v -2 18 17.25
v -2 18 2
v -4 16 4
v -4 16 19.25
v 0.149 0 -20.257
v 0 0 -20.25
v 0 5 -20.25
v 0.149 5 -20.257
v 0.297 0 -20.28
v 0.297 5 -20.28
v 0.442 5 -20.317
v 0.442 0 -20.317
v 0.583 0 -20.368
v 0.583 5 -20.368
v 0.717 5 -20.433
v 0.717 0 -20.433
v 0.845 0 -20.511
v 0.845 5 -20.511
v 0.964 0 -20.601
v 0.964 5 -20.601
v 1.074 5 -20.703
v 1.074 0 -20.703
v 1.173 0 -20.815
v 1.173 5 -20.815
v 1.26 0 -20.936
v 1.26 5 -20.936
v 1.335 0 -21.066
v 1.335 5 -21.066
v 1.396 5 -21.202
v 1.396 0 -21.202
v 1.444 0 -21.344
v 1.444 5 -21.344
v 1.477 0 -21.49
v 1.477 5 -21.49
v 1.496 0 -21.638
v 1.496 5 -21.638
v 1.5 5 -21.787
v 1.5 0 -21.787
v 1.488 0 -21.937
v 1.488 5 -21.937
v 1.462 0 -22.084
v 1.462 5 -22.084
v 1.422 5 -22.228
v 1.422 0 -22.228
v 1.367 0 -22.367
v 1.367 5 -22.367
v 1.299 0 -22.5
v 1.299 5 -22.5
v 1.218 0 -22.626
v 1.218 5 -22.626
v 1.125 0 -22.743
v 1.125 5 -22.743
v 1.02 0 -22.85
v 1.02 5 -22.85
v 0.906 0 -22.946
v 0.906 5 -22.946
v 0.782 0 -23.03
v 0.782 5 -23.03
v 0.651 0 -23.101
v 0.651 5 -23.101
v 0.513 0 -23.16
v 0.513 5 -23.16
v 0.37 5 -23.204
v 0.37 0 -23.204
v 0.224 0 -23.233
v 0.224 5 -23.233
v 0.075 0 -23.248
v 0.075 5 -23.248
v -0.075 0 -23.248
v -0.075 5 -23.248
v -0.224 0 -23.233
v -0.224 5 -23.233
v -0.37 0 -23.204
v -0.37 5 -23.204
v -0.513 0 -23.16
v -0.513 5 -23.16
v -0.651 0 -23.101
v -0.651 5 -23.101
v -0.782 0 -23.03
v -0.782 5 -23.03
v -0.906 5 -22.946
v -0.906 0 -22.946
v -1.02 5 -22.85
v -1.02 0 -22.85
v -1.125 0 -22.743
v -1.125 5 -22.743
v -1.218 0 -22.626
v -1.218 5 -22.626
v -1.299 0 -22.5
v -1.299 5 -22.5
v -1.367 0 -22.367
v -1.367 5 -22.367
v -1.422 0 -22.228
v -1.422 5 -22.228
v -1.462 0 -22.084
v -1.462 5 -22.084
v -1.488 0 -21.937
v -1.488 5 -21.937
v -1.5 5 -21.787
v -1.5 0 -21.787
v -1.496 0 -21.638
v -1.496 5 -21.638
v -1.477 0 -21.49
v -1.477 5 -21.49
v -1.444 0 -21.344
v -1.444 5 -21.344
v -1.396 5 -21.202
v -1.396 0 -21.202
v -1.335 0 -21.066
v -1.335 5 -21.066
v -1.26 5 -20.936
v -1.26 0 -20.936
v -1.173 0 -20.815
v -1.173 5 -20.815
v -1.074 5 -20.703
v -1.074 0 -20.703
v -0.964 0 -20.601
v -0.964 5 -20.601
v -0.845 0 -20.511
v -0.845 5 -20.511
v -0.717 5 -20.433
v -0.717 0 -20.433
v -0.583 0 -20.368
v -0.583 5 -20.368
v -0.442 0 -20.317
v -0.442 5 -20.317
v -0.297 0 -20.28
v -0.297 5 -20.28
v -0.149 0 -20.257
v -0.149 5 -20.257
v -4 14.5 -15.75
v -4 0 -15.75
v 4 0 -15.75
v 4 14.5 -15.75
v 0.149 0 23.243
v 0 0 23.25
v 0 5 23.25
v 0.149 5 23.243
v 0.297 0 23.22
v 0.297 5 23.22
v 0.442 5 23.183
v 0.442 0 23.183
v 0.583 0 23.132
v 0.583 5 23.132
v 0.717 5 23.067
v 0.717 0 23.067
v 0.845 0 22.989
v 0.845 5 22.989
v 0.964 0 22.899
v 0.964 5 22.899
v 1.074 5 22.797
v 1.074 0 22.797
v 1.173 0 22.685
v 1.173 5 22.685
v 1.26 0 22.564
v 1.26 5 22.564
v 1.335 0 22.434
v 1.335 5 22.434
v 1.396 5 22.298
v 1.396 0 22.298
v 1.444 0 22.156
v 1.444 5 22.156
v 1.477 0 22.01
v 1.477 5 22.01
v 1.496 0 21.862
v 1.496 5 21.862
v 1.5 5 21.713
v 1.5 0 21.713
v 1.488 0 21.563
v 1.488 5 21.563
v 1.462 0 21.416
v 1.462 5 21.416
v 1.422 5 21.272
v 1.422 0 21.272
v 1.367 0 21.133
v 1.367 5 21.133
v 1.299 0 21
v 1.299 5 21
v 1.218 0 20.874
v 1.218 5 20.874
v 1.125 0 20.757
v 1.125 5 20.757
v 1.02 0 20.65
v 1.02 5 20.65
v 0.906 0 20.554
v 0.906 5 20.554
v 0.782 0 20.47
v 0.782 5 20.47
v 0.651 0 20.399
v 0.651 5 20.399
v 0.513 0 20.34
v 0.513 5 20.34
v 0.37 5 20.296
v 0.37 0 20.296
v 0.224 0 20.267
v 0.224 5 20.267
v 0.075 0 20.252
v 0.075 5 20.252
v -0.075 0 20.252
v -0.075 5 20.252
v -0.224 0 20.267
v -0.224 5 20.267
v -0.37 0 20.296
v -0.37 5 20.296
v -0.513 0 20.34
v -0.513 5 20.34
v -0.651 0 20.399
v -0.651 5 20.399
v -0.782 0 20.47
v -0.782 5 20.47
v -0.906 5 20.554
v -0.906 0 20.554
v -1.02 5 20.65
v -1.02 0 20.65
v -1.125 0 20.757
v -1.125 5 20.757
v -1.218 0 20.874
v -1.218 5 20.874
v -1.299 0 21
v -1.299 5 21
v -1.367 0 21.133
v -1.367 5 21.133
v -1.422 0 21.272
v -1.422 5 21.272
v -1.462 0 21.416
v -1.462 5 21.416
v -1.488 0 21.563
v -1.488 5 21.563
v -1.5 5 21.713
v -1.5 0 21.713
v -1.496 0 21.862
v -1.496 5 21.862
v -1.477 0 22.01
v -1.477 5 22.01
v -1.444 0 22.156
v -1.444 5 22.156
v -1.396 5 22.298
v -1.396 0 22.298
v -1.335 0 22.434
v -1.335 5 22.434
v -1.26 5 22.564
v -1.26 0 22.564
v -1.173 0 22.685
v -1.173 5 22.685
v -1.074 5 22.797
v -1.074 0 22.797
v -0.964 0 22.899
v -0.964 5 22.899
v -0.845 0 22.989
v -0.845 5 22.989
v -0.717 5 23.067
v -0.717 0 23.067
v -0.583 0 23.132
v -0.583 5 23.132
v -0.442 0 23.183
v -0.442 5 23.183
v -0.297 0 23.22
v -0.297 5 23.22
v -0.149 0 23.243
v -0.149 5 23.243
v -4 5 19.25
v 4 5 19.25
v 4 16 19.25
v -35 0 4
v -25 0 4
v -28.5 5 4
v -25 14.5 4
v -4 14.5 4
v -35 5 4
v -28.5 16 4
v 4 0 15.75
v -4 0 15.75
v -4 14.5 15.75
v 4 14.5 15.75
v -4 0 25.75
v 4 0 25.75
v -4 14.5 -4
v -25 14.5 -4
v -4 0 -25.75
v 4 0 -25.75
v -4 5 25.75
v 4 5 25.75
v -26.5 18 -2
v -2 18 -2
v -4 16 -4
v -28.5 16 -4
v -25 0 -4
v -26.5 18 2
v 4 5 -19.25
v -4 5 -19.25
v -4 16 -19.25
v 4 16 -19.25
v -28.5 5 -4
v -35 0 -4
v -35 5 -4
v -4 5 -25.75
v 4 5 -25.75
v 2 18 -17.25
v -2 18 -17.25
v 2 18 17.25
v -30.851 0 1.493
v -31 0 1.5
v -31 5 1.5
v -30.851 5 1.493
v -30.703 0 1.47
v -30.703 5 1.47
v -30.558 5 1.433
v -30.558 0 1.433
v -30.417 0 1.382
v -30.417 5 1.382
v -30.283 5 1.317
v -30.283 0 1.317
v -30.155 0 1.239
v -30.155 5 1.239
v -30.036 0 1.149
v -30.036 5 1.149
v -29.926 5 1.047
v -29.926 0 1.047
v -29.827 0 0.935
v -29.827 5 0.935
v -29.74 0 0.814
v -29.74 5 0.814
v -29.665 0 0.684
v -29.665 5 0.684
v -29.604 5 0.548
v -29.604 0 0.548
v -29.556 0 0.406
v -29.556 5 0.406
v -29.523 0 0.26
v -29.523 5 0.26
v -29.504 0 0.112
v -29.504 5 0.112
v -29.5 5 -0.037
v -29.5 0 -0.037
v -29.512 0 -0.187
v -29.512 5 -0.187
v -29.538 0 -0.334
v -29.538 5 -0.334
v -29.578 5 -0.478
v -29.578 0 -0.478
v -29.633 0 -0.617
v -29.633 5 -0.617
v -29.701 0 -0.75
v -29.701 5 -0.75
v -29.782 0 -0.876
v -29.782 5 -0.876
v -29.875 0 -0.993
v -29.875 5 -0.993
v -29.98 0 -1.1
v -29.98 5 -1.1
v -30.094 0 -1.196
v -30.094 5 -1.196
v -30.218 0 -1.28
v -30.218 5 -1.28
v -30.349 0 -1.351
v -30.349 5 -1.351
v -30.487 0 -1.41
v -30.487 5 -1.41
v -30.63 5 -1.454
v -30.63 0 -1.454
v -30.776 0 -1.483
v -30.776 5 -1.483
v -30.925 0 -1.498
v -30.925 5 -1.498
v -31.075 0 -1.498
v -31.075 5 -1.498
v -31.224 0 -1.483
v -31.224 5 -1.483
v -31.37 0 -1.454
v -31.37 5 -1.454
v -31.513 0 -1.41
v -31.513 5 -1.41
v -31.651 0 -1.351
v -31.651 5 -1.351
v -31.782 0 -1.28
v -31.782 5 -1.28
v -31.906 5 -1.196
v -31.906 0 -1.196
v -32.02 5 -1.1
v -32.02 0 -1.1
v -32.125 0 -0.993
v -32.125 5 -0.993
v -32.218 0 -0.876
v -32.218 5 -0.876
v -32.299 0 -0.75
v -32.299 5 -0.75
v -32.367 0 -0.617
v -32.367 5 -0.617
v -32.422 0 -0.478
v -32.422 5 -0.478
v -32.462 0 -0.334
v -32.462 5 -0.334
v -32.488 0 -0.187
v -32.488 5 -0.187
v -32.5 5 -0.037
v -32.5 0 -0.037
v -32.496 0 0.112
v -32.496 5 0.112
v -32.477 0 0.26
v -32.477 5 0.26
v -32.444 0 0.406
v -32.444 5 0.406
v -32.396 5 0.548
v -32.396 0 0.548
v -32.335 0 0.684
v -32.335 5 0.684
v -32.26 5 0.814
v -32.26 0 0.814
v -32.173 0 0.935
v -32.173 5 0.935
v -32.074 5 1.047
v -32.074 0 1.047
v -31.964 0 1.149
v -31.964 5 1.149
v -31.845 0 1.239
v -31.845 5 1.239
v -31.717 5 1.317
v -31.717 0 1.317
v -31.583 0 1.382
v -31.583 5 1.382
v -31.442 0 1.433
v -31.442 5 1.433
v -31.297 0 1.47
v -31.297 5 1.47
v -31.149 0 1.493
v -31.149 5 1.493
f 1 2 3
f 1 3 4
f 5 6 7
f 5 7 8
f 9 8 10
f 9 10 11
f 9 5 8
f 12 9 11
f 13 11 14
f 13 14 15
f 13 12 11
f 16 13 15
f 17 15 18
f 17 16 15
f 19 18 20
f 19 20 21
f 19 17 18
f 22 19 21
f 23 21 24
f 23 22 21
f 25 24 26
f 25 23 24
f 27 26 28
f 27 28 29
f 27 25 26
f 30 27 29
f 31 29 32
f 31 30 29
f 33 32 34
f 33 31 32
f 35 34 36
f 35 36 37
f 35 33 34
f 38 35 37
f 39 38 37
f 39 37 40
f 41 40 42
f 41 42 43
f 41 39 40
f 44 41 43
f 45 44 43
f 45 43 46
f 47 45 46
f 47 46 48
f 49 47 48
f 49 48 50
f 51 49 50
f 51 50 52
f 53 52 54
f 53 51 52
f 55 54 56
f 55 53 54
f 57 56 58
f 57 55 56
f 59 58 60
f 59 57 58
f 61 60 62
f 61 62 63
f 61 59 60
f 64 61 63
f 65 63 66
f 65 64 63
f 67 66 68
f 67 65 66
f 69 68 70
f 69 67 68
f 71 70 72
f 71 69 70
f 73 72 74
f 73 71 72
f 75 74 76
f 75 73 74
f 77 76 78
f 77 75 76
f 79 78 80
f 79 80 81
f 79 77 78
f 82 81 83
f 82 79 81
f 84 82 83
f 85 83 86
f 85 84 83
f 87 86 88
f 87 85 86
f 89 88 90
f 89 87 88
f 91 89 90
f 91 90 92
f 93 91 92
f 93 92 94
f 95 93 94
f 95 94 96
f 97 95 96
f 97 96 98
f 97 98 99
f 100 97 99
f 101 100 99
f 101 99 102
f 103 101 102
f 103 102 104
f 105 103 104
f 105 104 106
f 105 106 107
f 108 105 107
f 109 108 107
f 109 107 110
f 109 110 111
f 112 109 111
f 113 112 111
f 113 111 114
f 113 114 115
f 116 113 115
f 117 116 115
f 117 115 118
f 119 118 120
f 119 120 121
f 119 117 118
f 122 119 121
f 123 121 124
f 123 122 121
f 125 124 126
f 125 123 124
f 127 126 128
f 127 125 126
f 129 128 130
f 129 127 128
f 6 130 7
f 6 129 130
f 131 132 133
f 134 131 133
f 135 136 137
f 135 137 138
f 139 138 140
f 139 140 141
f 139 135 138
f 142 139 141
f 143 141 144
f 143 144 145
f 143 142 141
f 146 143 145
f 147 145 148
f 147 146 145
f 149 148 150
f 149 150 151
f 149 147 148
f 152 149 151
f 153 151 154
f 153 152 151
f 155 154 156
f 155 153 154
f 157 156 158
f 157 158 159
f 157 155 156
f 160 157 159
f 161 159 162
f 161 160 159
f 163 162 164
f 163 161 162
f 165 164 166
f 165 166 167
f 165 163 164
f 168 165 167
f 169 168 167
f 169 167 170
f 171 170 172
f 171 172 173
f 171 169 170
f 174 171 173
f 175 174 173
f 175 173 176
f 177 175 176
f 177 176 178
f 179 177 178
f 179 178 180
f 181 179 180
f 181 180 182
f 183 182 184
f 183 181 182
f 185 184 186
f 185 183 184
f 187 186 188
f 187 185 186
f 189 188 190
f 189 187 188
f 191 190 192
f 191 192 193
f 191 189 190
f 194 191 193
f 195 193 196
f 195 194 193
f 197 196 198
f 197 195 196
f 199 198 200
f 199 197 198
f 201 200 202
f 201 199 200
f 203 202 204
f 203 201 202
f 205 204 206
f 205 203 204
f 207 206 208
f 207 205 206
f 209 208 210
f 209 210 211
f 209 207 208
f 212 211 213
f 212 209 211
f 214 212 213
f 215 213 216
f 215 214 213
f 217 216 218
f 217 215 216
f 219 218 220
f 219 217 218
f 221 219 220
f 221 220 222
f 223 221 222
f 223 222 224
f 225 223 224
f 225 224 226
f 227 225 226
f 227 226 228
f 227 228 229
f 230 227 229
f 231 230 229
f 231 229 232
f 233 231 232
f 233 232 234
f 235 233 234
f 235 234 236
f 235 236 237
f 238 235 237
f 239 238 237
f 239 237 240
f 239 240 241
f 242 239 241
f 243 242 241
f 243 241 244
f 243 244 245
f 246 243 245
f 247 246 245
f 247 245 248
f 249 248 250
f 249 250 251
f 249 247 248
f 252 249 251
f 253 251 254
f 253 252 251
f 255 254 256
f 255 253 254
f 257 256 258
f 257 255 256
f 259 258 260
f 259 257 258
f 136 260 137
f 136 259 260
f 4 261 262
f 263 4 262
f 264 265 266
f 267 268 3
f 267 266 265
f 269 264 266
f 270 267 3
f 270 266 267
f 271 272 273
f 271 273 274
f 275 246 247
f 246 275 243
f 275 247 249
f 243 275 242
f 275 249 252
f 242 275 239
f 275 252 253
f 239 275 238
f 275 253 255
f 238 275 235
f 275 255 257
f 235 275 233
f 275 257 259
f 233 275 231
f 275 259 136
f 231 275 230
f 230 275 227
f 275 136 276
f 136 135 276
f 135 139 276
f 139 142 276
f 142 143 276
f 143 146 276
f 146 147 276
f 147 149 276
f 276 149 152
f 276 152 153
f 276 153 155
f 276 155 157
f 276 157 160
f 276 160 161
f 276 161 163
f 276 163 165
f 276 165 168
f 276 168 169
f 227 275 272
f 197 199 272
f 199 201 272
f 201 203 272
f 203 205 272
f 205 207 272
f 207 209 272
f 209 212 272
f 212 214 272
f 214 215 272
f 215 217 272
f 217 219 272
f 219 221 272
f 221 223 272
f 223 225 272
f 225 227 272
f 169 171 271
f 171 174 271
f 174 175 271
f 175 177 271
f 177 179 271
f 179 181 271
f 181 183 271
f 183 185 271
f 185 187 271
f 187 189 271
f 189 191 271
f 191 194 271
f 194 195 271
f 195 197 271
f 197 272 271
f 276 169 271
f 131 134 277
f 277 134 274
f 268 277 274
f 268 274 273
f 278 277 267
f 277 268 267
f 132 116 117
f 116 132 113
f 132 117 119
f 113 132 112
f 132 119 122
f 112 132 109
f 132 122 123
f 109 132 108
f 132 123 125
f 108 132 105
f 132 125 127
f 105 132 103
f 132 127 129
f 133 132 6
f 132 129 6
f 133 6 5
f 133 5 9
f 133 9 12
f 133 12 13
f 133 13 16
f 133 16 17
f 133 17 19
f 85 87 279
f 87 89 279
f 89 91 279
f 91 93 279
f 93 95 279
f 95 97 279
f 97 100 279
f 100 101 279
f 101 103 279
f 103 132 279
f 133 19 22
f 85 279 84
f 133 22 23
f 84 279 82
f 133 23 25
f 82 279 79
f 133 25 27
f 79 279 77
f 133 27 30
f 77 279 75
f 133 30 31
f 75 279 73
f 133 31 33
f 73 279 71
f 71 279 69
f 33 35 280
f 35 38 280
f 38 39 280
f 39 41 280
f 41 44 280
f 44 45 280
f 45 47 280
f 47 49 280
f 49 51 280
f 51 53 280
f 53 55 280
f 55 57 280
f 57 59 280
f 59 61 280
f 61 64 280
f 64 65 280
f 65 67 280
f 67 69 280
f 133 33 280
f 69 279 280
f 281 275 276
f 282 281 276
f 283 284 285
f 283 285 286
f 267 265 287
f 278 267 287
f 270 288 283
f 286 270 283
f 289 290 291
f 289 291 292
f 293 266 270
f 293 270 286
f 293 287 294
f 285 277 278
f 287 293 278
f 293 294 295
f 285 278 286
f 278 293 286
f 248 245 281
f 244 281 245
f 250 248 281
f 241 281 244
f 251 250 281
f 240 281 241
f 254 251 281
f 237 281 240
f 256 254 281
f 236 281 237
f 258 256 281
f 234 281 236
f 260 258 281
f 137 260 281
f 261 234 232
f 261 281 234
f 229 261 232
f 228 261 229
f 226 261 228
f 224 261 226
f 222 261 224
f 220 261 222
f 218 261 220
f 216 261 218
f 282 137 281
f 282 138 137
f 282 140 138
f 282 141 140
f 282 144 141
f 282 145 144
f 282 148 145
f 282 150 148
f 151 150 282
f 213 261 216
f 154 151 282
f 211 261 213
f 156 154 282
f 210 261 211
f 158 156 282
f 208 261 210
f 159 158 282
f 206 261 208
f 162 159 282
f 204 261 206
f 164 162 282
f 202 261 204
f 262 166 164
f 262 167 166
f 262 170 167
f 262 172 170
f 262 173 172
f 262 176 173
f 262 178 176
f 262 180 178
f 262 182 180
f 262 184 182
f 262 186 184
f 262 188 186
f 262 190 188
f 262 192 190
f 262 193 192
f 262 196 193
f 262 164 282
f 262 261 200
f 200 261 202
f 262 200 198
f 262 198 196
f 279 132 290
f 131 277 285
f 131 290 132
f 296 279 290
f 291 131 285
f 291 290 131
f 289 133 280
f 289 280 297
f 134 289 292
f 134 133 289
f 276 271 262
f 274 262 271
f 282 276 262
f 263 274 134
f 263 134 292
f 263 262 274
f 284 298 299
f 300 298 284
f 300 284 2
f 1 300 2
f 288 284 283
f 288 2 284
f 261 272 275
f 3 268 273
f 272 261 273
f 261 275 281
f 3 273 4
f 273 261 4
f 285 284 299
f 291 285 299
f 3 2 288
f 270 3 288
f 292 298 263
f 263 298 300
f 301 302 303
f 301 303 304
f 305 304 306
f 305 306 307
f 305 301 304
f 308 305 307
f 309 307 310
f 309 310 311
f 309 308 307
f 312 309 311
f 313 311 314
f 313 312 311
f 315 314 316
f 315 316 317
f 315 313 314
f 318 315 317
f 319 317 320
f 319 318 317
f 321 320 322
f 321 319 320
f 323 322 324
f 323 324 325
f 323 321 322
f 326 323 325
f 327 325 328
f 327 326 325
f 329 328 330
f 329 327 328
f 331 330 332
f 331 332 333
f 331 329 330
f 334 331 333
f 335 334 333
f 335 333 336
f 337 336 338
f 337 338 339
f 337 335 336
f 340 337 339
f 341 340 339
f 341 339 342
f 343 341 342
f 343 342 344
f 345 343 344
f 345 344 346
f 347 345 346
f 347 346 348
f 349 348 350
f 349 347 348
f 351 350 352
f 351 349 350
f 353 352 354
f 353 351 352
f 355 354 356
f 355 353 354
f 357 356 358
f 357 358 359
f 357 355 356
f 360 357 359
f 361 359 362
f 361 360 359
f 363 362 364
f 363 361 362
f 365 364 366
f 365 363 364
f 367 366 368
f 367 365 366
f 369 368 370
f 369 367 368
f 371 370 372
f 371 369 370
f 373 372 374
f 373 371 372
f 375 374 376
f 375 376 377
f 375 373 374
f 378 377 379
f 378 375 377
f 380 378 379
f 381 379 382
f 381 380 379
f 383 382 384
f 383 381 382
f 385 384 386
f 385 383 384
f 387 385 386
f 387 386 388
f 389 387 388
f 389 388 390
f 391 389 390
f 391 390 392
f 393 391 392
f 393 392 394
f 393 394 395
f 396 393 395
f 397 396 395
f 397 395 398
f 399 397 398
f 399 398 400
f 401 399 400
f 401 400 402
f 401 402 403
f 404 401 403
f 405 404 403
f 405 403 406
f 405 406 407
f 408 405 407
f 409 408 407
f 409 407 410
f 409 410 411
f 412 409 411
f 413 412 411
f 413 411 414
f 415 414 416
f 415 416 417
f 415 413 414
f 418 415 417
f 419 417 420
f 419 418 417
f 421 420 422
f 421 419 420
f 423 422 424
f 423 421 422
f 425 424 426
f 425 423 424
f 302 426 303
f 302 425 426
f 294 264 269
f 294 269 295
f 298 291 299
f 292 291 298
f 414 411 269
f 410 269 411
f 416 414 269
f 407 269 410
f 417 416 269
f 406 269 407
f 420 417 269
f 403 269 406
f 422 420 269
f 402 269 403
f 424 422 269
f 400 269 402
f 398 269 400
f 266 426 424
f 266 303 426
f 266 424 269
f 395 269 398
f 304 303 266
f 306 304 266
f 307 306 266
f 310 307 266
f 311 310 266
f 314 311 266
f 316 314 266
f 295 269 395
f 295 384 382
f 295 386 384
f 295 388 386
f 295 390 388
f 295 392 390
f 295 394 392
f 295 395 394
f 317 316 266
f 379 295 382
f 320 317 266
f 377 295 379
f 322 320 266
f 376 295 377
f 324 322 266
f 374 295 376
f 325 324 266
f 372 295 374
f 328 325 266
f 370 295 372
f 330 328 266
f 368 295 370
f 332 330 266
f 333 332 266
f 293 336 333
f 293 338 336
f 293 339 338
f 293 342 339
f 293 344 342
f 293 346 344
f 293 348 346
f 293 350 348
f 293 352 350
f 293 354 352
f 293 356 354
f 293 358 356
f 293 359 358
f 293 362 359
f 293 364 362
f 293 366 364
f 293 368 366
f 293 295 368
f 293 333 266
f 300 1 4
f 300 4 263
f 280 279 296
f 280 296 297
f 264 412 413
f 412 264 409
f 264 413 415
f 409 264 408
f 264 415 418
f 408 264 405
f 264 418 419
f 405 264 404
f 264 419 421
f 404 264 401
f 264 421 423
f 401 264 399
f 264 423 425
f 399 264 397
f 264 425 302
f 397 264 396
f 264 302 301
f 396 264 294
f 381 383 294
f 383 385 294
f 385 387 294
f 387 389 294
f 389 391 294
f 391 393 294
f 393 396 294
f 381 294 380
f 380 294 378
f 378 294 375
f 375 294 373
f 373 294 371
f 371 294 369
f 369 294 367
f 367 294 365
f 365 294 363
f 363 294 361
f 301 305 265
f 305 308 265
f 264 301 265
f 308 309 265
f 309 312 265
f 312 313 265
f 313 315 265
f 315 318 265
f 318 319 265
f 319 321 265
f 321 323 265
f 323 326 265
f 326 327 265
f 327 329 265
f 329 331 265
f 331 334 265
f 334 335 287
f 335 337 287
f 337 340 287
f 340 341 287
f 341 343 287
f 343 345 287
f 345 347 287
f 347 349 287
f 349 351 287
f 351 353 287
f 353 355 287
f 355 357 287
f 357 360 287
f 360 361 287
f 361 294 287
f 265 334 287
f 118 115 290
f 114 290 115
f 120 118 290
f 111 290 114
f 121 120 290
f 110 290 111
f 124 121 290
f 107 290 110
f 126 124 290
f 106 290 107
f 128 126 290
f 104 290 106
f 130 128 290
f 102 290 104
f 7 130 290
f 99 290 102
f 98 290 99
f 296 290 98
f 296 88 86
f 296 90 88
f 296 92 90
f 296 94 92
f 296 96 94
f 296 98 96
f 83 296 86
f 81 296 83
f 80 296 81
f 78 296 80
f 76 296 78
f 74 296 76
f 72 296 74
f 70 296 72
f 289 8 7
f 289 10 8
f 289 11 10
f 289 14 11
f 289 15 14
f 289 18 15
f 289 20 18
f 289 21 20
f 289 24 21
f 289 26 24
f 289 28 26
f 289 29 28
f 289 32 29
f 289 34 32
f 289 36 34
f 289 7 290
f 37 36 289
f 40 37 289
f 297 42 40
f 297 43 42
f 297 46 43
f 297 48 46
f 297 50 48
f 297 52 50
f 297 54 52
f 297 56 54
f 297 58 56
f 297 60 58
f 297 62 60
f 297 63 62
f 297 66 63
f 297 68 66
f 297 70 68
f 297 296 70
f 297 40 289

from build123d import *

# Parameters (mm, degrees)
IZIM1_W                       = 10
IZIM1_H                       = 8
IZIM1_R                       = 1.5
Y_KSEKLIK_EKSTR_ZYON1_DEPTH   = 5
IZIM1_W_2                     = 8
IZIM1_H_2                     = 10
Y_KSEKLIK_EKSTR_ZYON1_2_DEPTH = 5
Y_KSEKLIK_EKSTR_ZYON1_3_DEPTH = 5
IZIM2_W                       = 3.5
IZIM2_H                       = 8
IZIM2_W_2                     = 8
IZIM2_H_2                     = 3.5
Y_KSEKLIK_EKSTR_ZYON2_DEPTH   = 13
IZIM3_W                       = 8
IZIM3_H                       = 3.5
Y_KSEKLIK_EKSTR_ZYON3_DEPTH   = 29
IZIM4_W                       = 8
IZIM4_H                       = 3.5
Y_KSEKLIK_EKSTR_ZYON4_DEPTH   = 11.75
IZIM5_W                       = 8
IZIM5_H                       = 3.5
Y_KSEKLIK_EKSTR_ZYON5_DEPTH   = 11.75
PAH1_SIZE                     = 2


with BuildPart() as part:
    # Çizim1 → Yükseklik-Ekstrüzyon1 (new body)
    with BuildSketch(Plane(origin=(0, 0, 0), x_dir=(1, 0, 0), z_dir=(0, 1, 0))):
        with Locations((-30, 0)):
            Rectangle(IZIM1_W, IZIM1_H)
        with Locations(Location((-31, 0, 0), (0, 0, 270))):
            Circle(IZIM1_R, mode=Mode.SUBTRACT)
    extrude(amount=Y_KSEKLIK_EKSTR_ZYON1_DEPTH)



with BuildPart() as body_2:
    # Çizim1 → Y_kseklik-Ekstr_zyon1 2 (new body)
    with BuildSketch(Plane(origin=(0, 0, 0), x_dir=(1, 0, 0), z_dir=(0, 1, 0))):
        with Locations((0, 20.75)):
            Rectangle(IZIM1_W_2, IZIM1_H_2)
        with Locations(Location((0, 21.75, 0), (0, 0, 270))):
            Circle(IZIM1_R, mode=Mode.SUBTRACT)
    extrude(amount=Y_KSEKLIK_EKSTR_ZYON1_2_DEPTH)


with BuildPart() as body_3:
    # Çizim1 → Y_kseklik-Ekstr_zyon1 3 (new body)
    with BuildSketch(Plane(origin=(0, 0, 0), x_dir=(1, 0, 0), z_dir=(0, 1, 0))):
        with Locations((0, -20.75)):
            Rectangle(IZIM1_W_2, IZIM1_H_2)
        with Locations(Location((0, -21.75, 0), (0, 0, 270))):
            Circle(IZIM1_R, mode=Mode.SUBTRACT)
    extrude(amount=Y_KSEKLIK_EKSTR_ZYON1_3_DEPTH)


with BuildPart() as part_1:
    add(part.part)

    add(body_2.part)  # Yükseklik-Ekstrüzyon2 merges body 2

    add(body_3.part)  # Yükseklik-Ekstrüzyon2 merges body 3
    # Çizim2 → Yükseklik-Ekstrüzyon2 (add)
    with BuildSketch(Plane(origin=(0, 5, 0), x_dir=(1, 0, 0), z_dir=(0, 1, 0))):
        with Locations((-26.75, 0)):
            Rectangle(IZIM2_W, IZIM2_H)
        with Locations((0, 17.5)):
            Rectangle(IZIM2_W_2, IZIM2_H_2)
        with Locations((0, -17.5)):
            Rectangle(IZIM2_W_2, IZIM2_H_2)
    extrude(amount=Y_KSEKLIK_EKSTR_ZYON2_DEPTH)

    # Çizim3 → Yükseklik-Ekstrüzyon3 (add)
    with BuildSketch(Plane(origin=(-25, 0, 0), x_dir=(0, 0, -1), z_dir=(1, 0, 0))):
        with Locations((0, 16.25)):
            Rectangle(IZIM3_W, IZIM3_H)
    extrude(amount=Y_KSEKLIK_EKSTR_ZYON3_DEPTH)

    # Çizim4 → Yükseklik-Ekstrüzyon4 (add)
    with BuildSketch(Plane.XY.offset(-15.75)):
        with Locations((0, 16.25)):
            Rectangle(IZIM4_W, IZIM4_H)
    extrude(amount=Y_KSEKLIK_EKSTR_ZYON4_DEPTH)

    # Çizim5 → Yükseklik-Ekstrüzyon5 (add)
    with BuildSketch(Plane(origin=(0, 0, 15.75), x_dir=(-1, 0, 0), z_dir=(0, 0, -1))):
        with Locations((0, 16.25)):
            Rectangle(IZIM5_W, IZIM5_H)
    extrude(amount=Y_KSEKLIK_EKSTR_ZYON5_DEPTH)

    # Pah1
    pah1_edges = [part_1.edges().sort_by_distance(p)[0] for p in [
        (-4, 18, 11.625),
        (0, 18, 19.25),
        (4, 18, 0),
        (-4, 18, -11.625),
        (-16.25, 18, -4),
        (-28.5, 18, 0),
        (-16.25, 18, 4),
        (0, 18, -19.25),
    ]]
    chamfer(pah1_edges, length=PAH1_SIZE)


solid = part_1.part
